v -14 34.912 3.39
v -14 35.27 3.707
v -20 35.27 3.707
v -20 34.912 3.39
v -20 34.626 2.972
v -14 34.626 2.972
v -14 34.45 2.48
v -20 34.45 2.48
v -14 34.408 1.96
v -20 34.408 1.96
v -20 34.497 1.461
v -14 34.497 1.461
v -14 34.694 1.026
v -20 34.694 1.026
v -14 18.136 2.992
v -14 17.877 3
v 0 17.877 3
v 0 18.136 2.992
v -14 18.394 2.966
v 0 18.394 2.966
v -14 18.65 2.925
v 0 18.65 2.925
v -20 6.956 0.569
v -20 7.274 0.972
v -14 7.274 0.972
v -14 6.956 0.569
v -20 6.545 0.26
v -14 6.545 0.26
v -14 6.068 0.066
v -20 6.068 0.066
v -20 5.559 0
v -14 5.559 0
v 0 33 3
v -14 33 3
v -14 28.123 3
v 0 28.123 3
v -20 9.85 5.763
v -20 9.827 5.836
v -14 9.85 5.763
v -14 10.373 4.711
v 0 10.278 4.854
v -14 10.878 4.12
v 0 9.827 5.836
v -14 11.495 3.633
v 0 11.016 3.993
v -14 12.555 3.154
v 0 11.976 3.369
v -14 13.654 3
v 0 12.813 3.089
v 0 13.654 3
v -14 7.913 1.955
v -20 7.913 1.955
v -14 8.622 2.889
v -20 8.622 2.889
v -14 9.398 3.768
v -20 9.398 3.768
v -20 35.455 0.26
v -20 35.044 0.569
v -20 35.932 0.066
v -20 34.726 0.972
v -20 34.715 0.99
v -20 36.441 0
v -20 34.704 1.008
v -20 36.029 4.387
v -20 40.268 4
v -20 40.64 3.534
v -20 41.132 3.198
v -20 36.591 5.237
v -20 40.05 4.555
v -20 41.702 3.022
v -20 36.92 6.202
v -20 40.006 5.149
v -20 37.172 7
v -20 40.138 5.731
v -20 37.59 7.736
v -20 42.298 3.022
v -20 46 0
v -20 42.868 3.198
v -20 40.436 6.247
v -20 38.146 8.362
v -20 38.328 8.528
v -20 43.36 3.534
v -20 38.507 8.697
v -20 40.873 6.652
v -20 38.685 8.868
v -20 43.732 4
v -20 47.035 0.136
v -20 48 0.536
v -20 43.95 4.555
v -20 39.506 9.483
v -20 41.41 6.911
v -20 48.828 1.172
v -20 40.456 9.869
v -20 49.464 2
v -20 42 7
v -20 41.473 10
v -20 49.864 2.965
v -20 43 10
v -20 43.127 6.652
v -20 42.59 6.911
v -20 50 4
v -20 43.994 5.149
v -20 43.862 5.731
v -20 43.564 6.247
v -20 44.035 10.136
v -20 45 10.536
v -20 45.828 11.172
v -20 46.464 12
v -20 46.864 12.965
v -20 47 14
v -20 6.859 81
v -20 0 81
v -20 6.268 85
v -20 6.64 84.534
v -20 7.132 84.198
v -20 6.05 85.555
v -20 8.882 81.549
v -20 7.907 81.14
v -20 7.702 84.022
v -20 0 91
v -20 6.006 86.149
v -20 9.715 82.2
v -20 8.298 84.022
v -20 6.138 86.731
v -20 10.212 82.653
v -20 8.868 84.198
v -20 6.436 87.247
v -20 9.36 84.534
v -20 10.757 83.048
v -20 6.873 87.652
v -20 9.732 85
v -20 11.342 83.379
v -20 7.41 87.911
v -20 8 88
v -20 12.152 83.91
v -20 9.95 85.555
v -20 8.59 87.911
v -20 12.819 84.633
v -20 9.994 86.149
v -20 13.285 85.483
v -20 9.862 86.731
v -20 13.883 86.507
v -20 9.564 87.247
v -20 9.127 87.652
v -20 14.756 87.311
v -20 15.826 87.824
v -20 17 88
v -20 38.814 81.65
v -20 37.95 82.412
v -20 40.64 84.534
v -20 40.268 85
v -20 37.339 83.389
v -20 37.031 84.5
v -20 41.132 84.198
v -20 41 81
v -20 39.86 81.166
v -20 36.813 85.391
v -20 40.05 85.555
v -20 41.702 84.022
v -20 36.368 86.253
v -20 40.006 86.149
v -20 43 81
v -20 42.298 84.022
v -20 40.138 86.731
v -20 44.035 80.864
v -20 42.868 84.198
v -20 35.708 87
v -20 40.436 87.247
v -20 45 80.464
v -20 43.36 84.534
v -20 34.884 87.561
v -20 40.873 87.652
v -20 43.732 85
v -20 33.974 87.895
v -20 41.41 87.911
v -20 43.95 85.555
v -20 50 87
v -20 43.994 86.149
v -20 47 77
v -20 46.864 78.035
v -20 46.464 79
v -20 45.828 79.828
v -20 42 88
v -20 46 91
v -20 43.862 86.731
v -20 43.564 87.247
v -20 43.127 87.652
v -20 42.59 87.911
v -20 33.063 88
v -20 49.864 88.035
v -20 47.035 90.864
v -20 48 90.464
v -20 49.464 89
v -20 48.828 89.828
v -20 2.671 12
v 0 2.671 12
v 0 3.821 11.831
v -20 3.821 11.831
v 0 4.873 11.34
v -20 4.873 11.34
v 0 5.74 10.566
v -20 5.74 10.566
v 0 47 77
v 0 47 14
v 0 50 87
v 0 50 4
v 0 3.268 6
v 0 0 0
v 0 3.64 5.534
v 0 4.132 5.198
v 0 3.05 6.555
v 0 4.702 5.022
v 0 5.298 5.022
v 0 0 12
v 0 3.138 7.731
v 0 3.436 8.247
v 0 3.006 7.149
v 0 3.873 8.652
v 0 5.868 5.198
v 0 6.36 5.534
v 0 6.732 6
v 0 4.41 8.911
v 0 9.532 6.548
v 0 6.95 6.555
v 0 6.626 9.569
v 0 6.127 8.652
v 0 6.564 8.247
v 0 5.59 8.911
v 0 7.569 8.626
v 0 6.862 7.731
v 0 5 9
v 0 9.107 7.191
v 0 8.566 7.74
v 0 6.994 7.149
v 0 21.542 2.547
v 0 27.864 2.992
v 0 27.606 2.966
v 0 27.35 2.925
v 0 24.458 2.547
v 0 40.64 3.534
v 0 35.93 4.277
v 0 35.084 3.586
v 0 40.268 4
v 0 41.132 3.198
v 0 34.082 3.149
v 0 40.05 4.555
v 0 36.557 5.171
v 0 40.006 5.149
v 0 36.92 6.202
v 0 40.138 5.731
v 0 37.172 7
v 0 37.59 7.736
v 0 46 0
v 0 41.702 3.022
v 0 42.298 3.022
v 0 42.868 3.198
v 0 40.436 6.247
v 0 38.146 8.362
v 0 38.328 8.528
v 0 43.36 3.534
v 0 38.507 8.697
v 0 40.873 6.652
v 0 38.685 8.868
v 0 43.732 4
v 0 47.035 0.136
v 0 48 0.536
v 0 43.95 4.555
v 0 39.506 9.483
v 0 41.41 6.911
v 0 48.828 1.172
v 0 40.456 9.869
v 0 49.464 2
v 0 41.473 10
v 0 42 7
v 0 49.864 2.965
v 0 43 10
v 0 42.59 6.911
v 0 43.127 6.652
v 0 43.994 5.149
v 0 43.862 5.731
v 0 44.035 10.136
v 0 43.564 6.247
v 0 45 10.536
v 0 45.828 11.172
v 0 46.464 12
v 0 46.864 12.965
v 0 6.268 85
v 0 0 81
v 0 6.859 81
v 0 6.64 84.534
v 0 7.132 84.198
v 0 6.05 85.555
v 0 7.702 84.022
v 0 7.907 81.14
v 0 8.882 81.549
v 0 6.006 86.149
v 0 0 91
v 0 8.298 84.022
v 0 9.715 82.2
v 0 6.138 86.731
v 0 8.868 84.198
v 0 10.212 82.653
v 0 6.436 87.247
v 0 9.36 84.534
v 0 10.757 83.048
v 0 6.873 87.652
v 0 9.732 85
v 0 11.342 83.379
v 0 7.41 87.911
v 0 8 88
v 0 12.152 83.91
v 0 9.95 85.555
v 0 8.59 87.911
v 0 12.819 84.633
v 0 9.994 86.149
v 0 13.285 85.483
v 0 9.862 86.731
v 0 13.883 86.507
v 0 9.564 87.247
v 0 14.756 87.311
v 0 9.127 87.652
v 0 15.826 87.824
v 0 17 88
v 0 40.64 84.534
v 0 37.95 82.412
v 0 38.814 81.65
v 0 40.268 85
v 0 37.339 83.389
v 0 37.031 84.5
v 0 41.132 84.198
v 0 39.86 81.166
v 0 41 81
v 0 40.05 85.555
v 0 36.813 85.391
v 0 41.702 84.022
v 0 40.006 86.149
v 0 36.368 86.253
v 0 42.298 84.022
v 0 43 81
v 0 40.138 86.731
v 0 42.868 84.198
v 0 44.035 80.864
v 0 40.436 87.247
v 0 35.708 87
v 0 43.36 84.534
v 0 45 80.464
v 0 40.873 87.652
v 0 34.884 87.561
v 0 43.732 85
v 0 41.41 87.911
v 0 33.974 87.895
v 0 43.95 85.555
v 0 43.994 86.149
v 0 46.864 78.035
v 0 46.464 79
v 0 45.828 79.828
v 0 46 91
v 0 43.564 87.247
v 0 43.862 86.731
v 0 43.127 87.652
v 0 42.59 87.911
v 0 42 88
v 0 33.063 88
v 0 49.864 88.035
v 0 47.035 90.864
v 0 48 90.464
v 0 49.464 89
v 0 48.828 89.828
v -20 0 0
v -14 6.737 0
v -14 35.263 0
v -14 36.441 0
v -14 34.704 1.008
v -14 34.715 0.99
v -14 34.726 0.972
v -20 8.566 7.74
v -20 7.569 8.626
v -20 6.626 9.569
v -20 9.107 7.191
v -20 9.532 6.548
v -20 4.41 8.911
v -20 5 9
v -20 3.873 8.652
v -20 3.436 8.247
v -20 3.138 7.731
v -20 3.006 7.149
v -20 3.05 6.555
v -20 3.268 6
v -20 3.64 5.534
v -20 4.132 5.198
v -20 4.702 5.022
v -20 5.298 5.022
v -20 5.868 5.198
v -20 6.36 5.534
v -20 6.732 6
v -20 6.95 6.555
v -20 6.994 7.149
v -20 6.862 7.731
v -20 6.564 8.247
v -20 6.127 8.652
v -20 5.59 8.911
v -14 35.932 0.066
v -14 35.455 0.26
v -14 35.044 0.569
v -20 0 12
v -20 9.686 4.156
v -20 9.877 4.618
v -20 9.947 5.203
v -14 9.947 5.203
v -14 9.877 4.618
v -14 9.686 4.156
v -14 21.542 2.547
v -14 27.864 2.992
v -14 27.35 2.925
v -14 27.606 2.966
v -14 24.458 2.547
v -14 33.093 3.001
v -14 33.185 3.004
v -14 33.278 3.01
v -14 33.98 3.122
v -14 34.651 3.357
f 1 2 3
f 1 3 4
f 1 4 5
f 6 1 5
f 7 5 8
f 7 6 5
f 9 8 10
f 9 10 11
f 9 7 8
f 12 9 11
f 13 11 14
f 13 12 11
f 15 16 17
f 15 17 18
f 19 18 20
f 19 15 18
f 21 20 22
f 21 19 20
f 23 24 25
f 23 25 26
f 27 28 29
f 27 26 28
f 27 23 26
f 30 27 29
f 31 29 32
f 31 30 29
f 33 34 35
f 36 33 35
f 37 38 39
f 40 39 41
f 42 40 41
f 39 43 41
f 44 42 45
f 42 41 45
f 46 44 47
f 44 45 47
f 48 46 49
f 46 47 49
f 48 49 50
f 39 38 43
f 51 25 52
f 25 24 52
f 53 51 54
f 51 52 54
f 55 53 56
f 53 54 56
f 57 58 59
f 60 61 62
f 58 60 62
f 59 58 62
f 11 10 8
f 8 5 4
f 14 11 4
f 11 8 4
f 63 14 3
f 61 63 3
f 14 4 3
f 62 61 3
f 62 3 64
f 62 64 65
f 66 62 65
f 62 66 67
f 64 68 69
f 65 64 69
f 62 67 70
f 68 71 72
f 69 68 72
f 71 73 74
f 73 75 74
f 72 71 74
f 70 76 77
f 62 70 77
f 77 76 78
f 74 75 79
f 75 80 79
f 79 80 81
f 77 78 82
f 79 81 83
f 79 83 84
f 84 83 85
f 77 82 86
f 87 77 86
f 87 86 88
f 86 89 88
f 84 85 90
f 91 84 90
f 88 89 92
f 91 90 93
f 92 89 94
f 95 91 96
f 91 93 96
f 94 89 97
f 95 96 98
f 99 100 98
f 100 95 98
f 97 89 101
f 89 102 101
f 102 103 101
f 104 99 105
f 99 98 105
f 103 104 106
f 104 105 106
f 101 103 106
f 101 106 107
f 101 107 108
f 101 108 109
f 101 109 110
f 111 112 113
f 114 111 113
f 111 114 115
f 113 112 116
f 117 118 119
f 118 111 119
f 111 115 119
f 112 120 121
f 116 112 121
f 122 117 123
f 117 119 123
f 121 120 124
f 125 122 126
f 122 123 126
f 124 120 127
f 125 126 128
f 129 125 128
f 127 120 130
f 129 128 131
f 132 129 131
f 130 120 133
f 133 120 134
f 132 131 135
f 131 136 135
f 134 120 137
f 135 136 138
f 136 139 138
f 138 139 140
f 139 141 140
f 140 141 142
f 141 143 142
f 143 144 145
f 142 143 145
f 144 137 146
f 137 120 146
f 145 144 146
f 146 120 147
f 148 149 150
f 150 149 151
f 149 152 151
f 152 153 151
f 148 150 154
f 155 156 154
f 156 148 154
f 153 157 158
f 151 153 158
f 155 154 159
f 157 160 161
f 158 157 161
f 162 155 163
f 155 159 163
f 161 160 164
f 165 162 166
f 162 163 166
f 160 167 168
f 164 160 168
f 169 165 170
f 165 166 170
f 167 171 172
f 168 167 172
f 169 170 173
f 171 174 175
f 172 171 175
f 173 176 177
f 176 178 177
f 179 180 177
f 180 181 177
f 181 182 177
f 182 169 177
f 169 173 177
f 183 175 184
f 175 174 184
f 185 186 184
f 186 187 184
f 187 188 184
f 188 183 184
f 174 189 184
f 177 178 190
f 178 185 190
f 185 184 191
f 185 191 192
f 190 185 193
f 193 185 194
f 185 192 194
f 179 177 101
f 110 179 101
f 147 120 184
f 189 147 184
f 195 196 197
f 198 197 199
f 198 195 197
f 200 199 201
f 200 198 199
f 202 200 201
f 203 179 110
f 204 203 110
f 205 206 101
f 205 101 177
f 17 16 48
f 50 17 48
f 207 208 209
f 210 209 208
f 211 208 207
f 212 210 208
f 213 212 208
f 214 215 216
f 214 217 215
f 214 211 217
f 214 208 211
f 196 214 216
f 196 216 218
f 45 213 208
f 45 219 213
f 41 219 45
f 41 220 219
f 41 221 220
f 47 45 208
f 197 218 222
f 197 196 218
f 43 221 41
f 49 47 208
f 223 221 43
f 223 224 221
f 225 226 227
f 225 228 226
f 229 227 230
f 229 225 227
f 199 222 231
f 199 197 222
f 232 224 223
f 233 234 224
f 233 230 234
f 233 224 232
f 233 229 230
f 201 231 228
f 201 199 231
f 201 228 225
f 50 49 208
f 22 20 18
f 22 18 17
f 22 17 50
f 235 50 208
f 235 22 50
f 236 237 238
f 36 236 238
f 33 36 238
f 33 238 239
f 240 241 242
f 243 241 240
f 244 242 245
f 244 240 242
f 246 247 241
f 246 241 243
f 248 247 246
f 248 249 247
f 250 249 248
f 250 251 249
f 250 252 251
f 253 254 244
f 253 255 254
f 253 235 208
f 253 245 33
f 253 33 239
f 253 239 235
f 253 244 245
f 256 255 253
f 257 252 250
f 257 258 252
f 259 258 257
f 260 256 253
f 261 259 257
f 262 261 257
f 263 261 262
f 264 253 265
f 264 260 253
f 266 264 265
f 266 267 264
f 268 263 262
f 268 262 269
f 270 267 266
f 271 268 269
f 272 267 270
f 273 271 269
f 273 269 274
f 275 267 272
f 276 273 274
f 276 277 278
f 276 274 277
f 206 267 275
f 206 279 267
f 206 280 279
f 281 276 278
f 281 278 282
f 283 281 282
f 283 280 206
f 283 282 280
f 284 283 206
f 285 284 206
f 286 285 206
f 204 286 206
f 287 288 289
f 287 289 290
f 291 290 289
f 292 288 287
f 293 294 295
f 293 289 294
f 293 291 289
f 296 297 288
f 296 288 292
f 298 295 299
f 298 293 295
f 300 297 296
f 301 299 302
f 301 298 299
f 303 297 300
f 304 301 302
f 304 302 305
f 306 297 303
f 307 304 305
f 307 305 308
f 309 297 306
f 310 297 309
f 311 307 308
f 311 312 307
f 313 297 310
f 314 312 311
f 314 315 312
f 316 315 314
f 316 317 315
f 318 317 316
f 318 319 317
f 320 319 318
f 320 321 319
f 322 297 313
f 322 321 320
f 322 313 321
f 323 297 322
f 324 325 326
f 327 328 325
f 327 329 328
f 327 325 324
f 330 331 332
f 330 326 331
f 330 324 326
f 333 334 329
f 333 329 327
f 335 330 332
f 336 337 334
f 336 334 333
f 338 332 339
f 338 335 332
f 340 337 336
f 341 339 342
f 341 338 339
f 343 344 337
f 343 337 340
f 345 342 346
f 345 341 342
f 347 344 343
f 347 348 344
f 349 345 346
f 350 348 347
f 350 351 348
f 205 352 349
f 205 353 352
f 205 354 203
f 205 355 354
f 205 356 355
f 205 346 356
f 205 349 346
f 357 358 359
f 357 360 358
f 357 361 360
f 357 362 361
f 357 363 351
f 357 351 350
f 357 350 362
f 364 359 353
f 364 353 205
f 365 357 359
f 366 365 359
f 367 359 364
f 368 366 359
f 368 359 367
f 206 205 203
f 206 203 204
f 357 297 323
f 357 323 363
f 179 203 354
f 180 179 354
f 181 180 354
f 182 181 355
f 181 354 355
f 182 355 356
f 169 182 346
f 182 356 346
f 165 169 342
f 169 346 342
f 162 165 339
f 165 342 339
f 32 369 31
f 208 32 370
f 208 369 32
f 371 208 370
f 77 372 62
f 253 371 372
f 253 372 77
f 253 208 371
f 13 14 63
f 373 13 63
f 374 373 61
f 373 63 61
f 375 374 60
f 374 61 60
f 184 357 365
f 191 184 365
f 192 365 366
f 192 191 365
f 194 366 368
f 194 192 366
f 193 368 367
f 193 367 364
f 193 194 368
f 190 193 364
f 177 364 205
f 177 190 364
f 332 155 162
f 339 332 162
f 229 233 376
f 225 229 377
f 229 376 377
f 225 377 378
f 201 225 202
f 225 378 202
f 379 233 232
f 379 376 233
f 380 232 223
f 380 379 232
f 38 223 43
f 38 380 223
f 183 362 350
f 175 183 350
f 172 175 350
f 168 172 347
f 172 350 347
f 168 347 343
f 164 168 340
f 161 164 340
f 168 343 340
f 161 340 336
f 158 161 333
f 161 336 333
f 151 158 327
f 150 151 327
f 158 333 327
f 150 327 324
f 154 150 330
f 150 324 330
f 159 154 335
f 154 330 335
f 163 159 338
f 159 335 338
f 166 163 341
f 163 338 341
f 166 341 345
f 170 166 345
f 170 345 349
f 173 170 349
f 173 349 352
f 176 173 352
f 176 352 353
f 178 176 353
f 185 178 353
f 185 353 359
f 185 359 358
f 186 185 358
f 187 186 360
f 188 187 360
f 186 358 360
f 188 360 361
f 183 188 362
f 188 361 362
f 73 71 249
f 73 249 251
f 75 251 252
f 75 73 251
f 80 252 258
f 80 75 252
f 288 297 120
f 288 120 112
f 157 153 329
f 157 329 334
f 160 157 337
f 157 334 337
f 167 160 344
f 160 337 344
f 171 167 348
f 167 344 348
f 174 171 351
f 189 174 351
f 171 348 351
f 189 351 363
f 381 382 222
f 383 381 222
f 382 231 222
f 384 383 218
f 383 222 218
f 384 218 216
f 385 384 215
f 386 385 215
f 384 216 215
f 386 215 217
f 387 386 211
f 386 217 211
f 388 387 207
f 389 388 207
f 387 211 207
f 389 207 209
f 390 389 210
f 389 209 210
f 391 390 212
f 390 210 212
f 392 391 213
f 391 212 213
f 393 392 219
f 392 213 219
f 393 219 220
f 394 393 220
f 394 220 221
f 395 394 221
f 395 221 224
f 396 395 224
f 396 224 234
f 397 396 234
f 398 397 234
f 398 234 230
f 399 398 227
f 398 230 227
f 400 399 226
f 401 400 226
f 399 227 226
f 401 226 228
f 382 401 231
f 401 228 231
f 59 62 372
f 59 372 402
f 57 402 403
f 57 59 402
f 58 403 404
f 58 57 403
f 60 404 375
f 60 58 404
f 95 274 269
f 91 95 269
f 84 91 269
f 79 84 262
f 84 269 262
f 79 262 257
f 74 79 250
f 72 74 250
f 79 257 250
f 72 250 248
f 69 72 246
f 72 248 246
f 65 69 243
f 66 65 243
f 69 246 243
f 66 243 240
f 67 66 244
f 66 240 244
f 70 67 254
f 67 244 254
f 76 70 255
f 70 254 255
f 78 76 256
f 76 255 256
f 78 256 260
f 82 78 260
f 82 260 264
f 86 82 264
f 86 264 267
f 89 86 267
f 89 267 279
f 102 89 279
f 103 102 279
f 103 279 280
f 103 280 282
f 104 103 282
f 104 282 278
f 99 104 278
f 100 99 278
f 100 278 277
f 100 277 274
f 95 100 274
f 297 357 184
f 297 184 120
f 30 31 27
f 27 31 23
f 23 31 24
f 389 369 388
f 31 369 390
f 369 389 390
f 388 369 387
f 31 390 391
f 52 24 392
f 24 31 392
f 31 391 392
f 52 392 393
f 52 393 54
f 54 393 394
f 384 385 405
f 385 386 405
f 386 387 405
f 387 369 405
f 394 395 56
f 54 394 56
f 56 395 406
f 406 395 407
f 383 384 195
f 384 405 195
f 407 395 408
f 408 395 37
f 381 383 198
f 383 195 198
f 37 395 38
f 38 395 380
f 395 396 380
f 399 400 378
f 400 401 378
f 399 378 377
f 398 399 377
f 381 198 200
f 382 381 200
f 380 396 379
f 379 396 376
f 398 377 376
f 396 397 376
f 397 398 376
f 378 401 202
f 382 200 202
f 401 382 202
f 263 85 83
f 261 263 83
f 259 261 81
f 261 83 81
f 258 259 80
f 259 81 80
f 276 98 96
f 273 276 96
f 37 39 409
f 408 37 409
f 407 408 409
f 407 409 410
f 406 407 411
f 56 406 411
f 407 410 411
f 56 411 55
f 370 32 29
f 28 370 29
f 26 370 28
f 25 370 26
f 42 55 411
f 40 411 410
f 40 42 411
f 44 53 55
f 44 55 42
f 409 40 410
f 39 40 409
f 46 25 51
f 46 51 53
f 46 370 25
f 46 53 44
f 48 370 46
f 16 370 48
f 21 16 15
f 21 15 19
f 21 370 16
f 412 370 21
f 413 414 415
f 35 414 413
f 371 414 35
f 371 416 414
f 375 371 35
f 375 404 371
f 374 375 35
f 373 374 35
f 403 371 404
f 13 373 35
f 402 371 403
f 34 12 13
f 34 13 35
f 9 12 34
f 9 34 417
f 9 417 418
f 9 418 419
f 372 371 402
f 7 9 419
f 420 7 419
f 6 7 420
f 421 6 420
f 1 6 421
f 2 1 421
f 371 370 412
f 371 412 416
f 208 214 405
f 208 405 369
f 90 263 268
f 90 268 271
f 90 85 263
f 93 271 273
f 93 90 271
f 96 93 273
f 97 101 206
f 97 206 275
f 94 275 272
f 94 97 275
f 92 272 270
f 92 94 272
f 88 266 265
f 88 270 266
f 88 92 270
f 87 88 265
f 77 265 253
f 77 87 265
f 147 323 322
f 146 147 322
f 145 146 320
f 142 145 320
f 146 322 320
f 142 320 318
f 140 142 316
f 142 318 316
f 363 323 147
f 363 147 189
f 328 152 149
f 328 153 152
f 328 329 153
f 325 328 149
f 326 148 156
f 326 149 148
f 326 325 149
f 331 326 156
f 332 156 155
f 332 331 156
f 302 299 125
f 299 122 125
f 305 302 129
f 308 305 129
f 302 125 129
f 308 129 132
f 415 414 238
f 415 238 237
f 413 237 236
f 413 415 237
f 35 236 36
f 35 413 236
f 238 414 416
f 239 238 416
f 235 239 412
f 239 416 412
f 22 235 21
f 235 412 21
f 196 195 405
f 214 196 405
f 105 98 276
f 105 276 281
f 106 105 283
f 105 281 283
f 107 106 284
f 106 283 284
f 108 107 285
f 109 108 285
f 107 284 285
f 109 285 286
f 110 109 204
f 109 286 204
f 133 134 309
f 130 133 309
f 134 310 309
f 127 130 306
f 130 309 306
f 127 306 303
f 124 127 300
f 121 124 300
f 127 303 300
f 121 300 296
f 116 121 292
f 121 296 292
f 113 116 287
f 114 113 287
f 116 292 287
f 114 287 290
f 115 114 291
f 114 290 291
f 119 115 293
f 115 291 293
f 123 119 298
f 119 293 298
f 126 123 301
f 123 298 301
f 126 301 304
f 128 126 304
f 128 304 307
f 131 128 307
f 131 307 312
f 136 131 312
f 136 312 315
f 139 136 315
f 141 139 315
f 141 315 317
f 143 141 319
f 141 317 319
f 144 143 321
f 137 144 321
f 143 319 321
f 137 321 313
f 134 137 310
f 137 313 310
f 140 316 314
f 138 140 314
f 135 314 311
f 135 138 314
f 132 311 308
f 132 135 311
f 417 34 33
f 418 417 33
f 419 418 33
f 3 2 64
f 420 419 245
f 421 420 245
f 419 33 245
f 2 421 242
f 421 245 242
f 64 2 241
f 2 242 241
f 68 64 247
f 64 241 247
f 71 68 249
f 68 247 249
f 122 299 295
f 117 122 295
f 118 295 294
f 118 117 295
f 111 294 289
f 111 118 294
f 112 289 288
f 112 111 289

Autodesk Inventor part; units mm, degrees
ref_plane "YZ Plane" through (0, 0, 0) normal (1, 0, 0) x (0, 1, 0)
ref_plane "XZ Plane" through (0, 0, 0) normal (0, 1, 0) x (-1, 0, 0)
ref_plane "XY Plane" through (0, 0, 0) normal (0, 0, 1) x (1, 0, 0)
sketch "Sketch2" plane through (0, 0, 0) normal (1, 0, 0) x (0, 1, 0)
  line L0 (0, 0) -> (50, 0)
  line L1 (50, 0) -> (50, 91)
  line L2 (50, 91) -> (0, 91)
  line L3 (0, 91) -> (0, 0)
  dimension "d39" = 50
  dimension "d40" = 91
extrude "Extrusion2" add sketch "Sketch2" against normal blind 20
sketch "Sketch3" plane through (-20, 0, 0) normal (-1, 0, 0) x (0, 0, 1)
  line L0 (0, 0) -> (91, 0) projected
  line L1 (0, 50) -> (0, 0) projected
  point P0 (7, 5)
  point P1 (5, 42)
  point P2 (86, 42)
  point P3 (86, 8)
  dimension "d43" = 8
  dimension "d44" = 86
  dimension "d45" = 42
  dimension "d46" = 5
  dimension "d47" = 7
  dimension "d48" = 5
hole "Hole1" at (-20, 5, 7) at (-20, 42, 5) at (-20, 42, 86) at (-20, 8, 86) direction (1, 0, 0) diameter 4 end through all
fillet "Fillet8" radius 4 2 edges at (-10, 50, 0) (-10, 50, 91)
sketch "Sketch4" plane through (-20, 0, 0) normal (-1, 0, 0) x (0, 0, 1)
  line L0 (91, 0) -> (0, 0) projected
  line L1 (12, 0) -> (81, 0)
  line L2 (81, 13) -> (81, 0)
  line L3 (81, 13) -> (88, 13)
  line L4 (88, 13) -> (88, 37)
  line L5 (88, 37) -> (81, 37)
  line L6 (81, 37) -> (81, 47)
  line L7 (81, 47) -> (10, 47)
  line L8 (10, 47) -> (10, 37)
  line L9 (10, 37) -> (3, 37)
  line L10 (3, 37) -> (3, 10)
  line L11 (0, 46) -> (0, 0) projected
  line L12 (3, 10) -> (12, 10)
  line L13 (12, 10) -> (12, 0)
  line L14 (0, 0) -> (91, 0) projected
  dimension "d57" = 3
  dimension "d58" = 88
  dimension "d59" = 47
  dimension "d60" = 10
  dimension "d61" = 37
  dimension "d62" = 81
  dimension "d63" = 13
  dimension "d67" = 12
  dimension "d68" = 10
extrude "Extrusion3" cut sketch "Sketch4" against normal through all
sketch "Sketch5" plane through (-20, 0, 0) normal (-1, 0, 0) x (0, 0, 1)
  circle A0 centre (25, 23) radius 22.5
  circle A1 centre (78, 14) radius 6
  point P0 (0, 0)
  dimension "d69" = 25
  dimension "d70" = 23
  dimension "d71" = 45
  dimension "d75" = 12
  dimension "d76" = 78
  dimension "d77" = 14
extrude "Extrusion4" cut sketch "Sketch5" against normal through all
fillet "Fillet9" radius 4 15 edges at (-10, 37, 3) (-10, 18.283, 3) (-10, 27.717, 3) (-10, 10, 3) (-10, 10, 6.6356) (-10, 4.6356, 12) (-10, 37, 7.3861) (-10, 39.7705, 10) (-10, 47, 10) (-10, 47, 81) (-10, 37, 81) (-10, 37, 88) (-10, 13, 88) (-10, 13, 83.9161) (-10, 8.8038, 81)
sketch "Sketch6" plane through (-20, 0, 0) normal (-1, 0, 0) x (0, 0, 1)
  circle A0 centre (-7.25, 21) radius 16
  point P0 (0, 0)
  dimension "d78" = 32
  dimension "d79" = 21
  dimension "d80" = 7.25
extrude "Extrusion5" cut sketch "Sketch6" against normal blind 6
fillet "Fillet10" radius 2 4 edges at (-17, 35.2632, 0) (-17, 6.7368, 0) (-17, 33.2776, 3.0096) (-17, 10.3732, 4.7112)
properties part number "One Motor Gearbox Cover"
